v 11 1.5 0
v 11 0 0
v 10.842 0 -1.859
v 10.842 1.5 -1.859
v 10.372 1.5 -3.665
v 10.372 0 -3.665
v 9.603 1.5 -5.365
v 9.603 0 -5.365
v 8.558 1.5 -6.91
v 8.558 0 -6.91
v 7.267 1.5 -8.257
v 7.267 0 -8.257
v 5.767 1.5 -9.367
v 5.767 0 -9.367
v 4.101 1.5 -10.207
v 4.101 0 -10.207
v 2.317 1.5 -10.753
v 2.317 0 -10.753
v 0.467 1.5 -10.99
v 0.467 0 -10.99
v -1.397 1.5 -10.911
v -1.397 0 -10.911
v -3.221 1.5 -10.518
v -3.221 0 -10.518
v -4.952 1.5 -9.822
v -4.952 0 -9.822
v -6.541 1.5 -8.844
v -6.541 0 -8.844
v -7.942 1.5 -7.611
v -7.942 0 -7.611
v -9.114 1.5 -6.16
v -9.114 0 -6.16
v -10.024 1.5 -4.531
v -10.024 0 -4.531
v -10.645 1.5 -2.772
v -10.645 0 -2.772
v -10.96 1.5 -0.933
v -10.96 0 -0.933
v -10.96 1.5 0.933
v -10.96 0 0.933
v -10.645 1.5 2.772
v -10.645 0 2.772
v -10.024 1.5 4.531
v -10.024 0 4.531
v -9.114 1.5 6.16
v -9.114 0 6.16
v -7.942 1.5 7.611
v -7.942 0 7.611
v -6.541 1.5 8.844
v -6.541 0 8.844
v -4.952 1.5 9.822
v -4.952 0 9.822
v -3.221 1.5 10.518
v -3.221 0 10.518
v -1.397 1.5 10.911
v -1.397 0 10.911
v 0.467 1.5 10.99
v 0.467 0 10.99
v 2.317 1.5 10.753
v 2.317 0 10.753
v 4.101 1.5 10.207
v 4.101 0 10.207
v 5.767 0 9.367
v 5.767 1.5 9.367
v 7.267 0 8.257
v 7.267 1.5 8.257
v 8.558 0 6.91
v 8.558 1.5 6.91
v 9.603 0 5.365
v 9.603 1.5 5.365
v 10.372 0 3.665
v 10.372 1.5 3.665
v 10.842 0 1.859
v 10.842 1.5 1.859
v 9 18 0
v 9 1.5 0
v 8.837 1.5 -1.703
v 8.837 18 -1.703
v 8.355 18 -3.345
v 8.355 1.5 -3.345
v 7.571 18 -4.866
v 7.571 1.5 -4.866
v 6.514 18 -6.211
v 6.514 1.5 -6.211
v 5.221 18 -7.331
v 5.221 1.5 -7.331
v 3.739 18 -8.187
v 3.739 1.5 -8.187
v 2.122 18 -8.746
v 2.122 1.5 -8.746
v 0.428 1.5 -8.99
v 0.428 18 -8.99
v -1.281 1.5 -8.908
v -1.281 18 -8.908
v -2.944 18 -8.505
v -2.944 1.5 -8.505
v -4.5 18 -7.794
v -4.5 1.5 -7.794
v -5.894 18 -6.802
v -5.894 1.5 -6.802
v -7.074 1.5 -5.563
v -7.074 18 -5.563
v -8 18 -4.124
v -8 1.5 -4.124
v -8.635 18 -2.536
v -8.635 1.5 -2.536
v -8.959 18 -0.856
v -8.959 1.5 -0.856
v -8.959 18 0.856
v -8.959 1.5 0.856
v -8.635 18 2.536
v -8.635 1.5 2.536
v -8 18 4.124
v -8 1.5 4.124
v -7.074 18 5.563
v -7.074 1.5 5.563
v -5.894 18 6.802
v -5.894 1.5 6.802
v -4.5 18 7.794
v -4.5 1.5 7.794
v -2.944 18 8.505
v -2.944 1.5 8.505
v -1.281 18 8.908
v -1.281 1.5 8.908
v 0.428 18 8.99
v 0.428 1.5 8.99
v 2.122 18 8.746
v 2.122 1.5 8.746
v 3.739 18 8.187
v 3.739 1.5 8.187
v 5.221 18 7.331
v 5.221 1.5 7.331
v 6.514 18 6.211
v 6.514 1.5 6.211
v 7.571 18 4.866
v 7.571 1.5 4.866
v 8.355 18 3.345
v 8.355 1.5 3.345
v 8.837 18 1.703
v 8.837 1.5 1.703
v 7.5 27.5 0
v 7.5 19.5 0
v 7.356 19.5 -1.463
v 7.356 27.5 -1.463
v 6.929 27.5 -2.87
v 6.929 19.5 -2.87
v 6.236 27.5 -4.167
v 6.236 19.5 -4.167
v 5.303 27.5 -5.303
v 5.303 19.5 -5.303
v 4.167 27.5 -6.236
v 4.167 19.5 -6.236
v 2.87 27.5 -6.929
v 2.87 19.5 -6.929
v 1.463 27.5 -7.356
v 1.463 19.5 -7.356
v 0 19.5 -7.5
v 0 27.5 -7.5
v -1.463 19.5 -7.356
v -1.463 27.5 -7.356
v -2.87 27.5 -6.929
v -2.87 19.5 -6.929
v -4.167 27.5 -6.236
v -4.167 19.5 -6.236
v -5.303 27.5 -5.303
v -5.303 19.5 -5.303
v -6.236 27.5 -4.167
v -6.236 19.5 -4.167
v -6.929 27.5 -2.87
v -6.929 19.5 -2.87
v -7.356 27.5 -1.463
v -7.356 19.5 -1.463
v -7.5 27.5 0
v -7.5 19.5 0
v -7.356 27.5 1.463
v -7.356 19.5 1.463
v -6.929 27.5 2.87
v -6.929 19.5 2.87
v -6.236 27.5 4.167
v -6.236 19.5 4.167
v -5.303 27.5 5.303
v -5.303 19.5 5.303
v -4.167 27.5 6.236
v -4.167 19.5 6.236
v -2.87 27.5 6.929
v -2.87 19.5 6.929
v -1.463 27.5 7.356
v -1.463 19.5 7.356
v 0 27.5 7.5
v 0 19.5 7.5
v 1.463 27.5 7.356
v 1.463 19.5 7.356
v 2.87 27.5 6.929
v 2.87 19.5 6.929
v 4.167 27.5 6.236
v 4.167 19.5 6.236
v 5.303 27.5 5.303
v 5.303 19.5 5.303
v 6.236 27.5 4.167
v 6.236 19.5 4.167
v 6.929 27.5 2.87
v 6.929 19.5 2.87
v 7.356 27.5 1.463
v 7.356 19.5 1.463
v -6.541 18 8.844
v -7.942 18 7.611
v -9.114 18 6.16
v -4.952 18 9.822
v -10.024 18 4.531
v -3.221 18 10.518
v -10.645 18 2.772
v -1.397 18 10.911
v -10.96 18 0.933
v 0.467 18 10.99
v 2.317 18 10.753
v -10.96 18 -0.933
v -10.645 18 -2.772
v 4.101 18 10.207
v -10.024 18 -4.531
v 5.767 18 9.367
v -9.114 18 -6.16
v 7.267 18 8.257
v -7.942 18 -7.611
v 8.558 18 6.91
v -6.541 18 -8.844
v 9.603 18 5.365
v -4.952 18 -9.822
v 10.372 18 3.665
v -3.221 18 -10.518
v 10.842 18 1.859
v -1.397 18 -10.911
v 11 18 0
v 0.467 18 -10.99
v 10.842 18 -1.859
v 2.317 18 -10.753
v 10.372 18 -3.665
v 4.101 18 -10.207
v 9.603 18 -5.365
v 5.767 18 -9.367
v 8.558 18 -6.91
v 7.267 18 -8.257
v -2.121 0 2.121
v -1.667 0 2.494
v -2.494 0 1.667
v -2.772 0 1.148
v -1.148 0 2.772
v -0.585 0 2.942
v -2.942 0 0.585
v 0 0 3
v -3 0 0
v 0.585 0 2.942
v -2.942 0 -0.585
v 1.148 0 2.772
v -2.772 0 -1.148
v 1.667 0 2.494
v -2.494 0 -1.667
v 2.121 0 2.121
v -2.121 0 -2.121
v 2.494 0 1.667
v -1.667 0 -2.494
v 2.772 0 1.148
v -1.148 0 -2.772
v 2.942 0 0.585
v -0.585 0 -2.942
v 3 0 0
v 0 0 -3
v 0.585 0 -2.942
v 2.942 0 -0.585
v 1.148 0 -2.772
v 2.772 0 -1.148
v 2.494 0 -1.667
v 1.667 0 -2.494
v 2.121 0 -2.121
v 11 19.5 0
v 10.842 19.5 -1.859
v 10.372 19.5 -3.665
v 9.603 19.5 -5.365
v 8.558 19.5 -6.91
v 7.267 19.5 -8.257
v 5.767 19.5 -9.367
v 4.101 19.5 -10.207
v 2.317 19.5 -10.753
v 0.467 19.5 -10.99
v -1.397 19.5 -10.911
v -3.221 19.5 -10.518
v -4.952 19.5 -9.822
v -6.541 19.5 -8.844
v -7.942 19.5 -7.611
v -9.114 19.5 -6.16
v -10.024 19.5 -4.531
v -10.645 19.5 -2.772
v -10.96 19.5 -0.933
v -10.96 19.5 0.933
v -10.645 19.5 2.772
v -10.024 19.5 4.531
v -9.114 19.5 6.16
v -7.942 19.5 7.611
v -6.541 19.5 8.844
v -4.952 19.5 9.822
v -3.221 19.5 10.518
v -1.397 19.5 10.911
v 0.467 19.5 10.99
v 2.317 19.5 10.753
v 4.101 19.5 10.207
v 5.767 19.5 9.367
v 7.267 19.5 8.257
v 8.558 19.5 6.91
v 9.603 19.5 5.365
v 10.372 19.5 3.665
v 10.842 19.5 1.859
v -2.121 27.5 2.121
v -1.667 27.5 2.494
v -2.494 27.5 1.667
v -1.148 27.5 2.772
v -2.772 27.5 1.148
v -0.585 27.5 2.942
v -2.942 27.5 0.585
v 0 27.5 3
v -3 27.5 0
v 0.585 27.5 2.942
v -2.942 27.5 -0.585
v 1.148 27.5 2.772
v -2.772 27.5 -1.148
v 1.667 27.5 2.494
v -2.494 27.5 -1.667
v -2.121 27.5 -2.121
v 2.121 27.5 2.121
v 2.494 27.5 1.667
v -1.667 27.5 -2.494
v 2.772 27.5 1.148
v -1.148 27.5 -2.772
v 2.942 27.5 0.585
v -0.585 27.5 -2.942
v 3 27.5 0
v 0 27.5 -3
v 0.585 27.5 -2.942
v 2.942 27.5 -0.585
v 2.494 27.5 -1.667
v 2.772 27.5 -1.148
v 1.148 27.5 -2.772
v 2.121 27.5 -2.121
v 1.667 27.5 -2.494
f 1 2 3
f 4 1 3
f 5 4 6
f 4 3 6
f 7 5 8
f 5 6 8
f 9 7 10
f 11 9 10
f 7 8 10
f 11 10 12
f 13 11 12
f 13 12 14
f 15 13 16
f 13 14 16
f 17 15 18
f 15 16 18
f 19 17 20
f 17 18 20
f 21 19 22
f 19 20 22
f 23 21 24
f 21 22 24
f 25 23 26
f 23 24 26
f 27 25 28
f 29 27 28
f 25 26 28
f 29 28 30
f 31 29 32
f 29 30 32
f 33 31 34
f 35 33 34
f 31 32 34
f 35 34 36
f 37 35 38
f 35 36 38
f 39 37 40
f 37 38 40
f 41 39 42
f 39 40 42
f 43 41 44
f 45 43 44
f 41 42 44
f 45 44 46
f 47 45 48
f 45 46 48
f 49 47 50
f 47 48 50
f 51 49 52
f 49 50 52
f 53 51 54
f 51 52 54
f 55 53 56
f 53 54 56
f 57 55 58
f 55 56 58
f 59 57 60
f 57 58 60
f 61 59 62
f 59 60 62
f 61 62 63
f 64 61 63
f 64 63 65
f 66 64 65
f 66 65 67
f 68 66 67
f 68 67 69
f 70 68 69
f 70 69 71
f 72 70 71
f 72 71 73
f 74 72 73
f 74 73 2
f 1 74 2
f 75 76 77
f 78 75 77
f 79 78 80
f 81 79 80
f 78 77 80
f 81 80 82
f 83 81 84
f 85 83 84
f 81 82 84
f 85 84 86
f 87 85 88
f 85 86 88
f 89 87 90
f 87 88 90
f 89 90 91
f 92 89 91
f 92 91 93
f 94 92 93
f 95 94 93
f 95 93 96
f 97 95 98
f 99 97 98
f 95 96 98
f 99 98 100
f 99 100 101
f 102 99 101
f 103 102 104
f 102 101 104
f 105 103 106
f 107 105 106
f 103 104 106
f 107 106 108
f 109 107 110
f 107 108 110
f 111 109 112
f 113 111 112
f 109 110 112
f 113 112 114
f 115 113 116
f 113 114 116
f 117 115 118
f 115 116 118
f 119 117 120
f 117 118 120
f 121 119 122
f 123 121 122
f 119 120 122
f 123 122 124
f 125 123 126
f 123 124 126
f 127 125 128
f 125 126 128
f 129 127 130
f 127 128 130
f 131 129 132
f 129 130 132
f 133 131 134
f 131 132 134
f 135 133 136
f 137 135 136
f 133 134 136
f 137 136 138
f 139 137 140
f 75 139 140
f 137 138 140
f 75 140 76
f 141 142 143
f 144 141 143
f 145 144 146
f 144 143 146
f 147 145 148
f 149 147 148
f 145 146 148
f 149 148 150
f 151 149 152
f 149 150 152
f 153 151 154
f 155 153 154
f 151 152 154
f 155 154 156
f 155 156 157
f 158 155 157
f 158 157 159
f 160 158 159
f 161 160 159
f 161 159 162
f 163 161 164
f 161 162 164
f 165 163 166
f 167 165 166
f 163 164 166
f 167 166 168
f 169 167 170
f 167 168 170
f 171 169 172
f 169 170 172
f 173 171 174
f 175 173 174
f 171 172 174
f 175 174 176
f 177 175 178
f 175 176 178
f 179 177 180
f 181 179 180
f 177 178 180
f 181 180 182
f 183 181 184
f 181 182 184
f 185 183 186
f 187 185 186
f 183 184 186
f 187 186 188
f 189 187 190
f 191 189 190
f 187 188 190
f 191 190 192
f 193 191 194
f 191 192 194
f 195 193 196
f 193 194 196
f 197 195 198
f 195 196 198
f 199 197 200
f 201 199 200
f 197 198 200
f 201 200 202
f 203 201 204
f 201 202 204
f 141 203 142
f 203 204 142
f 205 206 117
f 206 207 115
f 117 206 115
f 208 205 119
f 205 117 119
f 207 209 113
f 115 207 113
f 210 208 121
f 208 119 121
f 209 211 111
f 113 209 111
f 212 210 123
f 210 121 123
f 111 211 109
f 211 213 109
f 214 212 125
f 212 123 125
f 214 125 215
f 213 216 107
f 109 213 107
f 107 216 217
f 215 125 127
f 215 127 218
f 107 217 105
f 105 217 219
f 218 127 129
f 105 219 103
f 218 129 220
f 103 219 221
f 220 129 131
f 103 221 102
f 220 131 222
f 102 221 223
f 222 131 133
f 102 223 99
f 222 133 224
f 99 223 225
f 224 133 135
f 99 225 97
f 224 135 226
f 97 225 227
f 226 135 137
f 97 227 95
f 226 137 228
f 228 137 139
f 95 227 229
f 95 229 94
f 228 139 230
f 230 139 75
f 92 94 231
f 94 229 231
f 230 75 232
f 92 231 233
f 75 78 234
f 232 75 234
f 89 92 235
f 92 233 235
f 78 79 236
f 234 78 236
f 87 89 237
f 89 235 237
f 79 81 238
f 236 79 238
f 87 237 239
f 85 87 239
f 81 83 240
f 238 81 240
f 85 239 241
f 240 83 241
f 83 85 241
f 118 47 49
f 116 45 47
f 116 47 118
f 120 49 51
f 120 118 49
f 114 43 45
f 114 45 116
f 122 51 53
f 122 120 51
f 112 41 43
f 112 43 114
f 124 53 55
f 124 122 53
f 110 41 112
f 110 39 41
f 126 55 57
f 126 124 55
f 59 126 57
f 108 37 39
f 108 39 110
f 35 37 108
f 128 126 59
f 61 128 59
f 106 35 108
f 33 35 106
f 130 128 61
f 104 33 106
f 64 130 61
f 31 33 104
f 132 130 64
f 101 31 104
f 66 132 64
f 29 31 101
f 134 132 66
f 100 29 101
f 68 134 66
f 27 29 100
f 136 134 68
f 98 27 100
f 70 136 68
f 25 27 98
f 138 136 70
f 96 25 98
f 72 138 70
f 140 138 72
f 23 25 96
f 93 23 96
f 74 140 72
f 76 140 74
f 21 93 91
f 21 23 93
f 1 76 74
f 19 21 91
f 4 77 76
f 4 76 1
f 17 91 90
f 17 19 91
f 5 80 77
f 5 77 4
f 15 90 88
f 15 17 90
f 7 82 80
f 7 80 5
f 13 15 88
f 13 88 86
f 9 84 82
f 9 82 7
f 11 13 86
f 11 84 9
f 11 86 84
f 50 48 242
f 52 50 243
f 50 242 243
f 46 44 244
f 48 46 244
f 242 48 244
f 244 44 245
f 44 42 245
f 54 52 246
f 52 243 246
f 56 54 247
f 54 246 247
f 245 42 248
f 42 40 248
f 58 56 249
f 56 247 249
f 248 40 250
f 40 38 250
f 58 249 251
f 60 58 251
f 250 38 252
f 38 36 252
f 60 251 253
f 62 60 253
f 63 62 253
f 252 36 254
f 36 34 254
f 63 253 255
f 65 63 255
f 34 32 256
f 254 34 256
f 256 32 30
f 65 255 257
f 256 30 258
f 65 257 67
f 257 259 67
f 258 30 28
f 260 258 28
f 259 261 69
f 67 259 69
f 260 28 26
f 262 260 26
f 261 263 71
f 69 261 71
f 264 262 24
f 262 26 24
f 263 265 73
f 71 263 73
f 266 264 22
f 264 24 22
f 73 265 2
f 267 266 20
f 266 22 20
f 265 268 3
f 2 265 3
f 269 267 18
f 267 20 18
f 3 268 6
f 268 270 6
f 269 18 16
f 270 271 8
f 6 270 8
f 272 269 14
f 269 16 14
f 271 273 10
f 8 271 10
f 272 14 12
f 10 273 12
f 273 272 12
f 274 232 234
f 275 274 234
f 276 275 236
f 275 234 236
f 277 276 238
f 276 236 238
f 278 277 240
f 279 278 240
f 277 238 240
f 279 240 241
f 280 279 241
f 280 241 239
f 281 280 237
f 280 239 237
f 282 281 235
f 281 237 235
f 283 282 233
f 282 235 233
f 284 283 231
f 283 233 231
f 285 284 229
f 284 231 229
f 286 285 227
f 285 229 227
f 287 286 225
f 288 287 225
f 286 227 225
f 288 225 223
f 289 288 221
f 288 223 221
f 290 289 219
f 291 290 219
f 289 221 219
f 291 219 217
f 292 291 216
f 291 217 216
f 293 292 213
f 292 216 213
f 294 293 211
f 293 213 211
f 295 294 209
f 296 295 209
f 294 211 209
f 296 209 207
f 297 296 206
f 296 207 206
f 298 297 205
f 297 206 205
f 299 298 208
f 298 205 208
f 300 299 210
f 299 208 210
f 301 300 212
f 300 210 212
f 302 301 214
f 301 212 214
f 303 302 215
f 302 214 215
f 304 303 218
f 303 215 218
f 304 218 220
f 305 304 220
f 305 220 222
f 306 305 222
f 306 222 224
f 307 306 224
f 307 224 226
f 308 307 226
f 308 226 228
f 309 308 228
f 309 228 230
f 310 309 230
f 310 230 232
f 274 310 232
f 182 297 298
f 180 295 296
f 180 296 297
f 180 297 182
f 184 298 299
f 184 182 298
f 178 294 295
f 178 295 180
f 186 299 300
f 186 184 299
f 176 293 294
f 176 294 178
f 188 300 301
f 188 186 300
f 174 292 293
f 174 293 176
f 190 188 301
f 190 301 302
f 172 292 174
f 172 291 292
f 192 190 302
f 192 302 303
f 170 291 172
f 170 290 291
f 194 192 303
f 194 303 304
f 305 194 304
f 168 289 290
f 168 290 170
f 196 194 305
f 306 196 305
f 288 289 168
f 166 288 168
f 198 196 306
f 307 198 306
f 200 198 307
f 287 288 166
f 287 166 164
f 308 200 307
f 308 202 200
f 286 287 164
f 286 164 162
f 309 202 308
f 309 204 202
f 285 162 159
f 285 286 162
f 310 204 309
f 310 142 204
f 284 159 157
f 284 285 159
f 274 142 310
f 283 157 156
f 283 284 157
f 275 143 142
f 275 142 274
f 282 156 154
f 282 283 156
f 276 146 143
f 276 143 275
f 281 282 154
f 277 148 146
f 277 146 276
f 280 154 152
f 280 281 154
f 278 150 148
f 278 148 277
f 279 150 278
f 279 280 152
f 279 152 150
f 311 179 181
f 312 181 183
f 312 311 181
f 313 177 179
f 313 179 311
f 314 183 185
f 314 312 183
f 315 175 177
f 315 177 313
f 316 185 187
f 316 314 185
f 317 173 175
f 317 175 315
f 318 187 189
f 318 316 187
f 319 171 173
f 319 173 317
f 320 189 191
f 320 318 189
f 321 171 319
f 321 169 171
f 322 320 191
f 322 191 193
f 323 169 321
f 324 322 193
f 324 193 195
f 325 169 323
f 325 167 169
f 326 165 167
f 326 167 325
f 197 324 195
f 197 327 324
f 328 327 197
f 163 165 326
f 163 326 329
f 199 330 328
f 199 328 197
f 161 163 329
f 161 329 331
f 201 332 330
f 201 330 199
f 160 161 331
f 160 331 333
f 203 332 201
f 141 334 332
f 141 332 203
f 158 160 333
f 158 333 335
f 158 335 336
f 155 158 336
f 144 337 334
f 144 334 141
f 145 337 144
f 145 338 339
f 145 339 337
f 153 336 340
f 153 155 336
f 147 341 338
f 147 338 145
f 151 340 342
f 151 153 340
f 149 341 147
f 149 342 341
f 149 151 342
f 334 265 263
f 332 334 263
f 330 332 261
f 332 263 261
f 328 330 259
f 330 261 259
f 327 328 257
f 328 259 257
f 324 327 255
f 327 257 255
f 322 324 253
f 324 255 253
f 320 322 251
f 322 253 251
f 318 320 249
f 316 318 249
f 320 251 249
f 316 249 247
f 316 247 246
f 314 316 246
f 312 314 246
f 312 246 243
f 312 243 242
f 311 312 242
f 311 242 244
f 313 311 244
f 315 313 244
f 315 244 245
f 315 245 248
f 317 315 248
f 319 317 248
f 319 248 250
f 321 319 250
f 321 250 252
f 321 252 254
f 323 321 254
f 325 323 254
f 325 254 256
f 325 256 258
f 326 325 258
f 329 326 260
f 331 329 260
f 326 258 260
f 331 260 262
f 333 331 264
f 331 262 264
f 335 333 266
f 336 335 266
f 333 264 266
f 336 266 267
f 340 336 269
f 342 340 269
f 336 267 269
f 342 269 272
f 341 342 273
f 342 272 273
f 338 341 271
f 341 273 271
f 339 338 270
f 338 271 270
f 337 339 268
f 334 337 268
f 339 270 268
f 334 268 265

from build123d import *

# Parameters (mm, degrees)
SKETCH1_R           = 11
BOSS_EXTRUDE1_DEPTH = 1.5
SKETCH2_R           = 9
BOSS_EXTRUDE2_DEPTH = 16.5
BOSS_EXTRUDE3_START = 18
SKETCH1_2_R         = 11
BOSS_EXTRUDE3_DEPTH = 1.5
SKETCH3_R           = 7.5
BOSS_EXTRUDE4_DEPTH = 8
SKETCH4_R           = 3
CUT_EXTRUDE1_DEPTH  = 28.5


with BuildPart() as part:
    # Sketch1 → Boss-Extrude1 (new body)
    with BuildSketch(Plane(origin=(0, 0, 0), x_dir=(1, 0, 0), z_dir=(0, 1, 0))):
        Circle(SKETCH1_R)
    extrude(amount=BOSS_EXTRUDE1_DEPTH)

    # Sketch2 → Boss-Extrude2 (add)
    with BuildSketch(Plane(origin=(0, 1.5, 0), x_dir=(1, 0, 0), z_dir=(0, 1, 0))):
        Circle(SKETCH2_R)
    extrude(amount=BOSS_EXTRUDE2_DEPTH)

    # Sketch1<2> → Boss-Extrude3 (add)
    with BuildSketch(Plane(origin=(0, 0, 0), x_dir=(1, 0, 0), z_dir=(0, 1, 0)).offset(BOSS_EXTRUDE3_START)):
        Circle(SKETCH1_2_R)
    extrude(amount=BOSS_EXTRUDE3_DEPTH)

    # Sketch3 → Boss-Extrude4 (add)
    with BuildSketch(Plane(origin=(0, 19.5, 0), x_dir=(1, 0, 0), z_dir=(0, 1, 0))):
        Circle(SKETCH3_R)
    extrude(amount=BOSS_EXTRUDE4_DEPTH)

    # Sketch4 → Cut-Extrude1 (cut, through all)
    with BuildSketch(Plane.XZ):
        Circle(SKETCH4_R)
    extrude(amount=-CUT_EXTRUDE1_DEPTH, mode=Mode.SUBTRACT)


solid = part.part
